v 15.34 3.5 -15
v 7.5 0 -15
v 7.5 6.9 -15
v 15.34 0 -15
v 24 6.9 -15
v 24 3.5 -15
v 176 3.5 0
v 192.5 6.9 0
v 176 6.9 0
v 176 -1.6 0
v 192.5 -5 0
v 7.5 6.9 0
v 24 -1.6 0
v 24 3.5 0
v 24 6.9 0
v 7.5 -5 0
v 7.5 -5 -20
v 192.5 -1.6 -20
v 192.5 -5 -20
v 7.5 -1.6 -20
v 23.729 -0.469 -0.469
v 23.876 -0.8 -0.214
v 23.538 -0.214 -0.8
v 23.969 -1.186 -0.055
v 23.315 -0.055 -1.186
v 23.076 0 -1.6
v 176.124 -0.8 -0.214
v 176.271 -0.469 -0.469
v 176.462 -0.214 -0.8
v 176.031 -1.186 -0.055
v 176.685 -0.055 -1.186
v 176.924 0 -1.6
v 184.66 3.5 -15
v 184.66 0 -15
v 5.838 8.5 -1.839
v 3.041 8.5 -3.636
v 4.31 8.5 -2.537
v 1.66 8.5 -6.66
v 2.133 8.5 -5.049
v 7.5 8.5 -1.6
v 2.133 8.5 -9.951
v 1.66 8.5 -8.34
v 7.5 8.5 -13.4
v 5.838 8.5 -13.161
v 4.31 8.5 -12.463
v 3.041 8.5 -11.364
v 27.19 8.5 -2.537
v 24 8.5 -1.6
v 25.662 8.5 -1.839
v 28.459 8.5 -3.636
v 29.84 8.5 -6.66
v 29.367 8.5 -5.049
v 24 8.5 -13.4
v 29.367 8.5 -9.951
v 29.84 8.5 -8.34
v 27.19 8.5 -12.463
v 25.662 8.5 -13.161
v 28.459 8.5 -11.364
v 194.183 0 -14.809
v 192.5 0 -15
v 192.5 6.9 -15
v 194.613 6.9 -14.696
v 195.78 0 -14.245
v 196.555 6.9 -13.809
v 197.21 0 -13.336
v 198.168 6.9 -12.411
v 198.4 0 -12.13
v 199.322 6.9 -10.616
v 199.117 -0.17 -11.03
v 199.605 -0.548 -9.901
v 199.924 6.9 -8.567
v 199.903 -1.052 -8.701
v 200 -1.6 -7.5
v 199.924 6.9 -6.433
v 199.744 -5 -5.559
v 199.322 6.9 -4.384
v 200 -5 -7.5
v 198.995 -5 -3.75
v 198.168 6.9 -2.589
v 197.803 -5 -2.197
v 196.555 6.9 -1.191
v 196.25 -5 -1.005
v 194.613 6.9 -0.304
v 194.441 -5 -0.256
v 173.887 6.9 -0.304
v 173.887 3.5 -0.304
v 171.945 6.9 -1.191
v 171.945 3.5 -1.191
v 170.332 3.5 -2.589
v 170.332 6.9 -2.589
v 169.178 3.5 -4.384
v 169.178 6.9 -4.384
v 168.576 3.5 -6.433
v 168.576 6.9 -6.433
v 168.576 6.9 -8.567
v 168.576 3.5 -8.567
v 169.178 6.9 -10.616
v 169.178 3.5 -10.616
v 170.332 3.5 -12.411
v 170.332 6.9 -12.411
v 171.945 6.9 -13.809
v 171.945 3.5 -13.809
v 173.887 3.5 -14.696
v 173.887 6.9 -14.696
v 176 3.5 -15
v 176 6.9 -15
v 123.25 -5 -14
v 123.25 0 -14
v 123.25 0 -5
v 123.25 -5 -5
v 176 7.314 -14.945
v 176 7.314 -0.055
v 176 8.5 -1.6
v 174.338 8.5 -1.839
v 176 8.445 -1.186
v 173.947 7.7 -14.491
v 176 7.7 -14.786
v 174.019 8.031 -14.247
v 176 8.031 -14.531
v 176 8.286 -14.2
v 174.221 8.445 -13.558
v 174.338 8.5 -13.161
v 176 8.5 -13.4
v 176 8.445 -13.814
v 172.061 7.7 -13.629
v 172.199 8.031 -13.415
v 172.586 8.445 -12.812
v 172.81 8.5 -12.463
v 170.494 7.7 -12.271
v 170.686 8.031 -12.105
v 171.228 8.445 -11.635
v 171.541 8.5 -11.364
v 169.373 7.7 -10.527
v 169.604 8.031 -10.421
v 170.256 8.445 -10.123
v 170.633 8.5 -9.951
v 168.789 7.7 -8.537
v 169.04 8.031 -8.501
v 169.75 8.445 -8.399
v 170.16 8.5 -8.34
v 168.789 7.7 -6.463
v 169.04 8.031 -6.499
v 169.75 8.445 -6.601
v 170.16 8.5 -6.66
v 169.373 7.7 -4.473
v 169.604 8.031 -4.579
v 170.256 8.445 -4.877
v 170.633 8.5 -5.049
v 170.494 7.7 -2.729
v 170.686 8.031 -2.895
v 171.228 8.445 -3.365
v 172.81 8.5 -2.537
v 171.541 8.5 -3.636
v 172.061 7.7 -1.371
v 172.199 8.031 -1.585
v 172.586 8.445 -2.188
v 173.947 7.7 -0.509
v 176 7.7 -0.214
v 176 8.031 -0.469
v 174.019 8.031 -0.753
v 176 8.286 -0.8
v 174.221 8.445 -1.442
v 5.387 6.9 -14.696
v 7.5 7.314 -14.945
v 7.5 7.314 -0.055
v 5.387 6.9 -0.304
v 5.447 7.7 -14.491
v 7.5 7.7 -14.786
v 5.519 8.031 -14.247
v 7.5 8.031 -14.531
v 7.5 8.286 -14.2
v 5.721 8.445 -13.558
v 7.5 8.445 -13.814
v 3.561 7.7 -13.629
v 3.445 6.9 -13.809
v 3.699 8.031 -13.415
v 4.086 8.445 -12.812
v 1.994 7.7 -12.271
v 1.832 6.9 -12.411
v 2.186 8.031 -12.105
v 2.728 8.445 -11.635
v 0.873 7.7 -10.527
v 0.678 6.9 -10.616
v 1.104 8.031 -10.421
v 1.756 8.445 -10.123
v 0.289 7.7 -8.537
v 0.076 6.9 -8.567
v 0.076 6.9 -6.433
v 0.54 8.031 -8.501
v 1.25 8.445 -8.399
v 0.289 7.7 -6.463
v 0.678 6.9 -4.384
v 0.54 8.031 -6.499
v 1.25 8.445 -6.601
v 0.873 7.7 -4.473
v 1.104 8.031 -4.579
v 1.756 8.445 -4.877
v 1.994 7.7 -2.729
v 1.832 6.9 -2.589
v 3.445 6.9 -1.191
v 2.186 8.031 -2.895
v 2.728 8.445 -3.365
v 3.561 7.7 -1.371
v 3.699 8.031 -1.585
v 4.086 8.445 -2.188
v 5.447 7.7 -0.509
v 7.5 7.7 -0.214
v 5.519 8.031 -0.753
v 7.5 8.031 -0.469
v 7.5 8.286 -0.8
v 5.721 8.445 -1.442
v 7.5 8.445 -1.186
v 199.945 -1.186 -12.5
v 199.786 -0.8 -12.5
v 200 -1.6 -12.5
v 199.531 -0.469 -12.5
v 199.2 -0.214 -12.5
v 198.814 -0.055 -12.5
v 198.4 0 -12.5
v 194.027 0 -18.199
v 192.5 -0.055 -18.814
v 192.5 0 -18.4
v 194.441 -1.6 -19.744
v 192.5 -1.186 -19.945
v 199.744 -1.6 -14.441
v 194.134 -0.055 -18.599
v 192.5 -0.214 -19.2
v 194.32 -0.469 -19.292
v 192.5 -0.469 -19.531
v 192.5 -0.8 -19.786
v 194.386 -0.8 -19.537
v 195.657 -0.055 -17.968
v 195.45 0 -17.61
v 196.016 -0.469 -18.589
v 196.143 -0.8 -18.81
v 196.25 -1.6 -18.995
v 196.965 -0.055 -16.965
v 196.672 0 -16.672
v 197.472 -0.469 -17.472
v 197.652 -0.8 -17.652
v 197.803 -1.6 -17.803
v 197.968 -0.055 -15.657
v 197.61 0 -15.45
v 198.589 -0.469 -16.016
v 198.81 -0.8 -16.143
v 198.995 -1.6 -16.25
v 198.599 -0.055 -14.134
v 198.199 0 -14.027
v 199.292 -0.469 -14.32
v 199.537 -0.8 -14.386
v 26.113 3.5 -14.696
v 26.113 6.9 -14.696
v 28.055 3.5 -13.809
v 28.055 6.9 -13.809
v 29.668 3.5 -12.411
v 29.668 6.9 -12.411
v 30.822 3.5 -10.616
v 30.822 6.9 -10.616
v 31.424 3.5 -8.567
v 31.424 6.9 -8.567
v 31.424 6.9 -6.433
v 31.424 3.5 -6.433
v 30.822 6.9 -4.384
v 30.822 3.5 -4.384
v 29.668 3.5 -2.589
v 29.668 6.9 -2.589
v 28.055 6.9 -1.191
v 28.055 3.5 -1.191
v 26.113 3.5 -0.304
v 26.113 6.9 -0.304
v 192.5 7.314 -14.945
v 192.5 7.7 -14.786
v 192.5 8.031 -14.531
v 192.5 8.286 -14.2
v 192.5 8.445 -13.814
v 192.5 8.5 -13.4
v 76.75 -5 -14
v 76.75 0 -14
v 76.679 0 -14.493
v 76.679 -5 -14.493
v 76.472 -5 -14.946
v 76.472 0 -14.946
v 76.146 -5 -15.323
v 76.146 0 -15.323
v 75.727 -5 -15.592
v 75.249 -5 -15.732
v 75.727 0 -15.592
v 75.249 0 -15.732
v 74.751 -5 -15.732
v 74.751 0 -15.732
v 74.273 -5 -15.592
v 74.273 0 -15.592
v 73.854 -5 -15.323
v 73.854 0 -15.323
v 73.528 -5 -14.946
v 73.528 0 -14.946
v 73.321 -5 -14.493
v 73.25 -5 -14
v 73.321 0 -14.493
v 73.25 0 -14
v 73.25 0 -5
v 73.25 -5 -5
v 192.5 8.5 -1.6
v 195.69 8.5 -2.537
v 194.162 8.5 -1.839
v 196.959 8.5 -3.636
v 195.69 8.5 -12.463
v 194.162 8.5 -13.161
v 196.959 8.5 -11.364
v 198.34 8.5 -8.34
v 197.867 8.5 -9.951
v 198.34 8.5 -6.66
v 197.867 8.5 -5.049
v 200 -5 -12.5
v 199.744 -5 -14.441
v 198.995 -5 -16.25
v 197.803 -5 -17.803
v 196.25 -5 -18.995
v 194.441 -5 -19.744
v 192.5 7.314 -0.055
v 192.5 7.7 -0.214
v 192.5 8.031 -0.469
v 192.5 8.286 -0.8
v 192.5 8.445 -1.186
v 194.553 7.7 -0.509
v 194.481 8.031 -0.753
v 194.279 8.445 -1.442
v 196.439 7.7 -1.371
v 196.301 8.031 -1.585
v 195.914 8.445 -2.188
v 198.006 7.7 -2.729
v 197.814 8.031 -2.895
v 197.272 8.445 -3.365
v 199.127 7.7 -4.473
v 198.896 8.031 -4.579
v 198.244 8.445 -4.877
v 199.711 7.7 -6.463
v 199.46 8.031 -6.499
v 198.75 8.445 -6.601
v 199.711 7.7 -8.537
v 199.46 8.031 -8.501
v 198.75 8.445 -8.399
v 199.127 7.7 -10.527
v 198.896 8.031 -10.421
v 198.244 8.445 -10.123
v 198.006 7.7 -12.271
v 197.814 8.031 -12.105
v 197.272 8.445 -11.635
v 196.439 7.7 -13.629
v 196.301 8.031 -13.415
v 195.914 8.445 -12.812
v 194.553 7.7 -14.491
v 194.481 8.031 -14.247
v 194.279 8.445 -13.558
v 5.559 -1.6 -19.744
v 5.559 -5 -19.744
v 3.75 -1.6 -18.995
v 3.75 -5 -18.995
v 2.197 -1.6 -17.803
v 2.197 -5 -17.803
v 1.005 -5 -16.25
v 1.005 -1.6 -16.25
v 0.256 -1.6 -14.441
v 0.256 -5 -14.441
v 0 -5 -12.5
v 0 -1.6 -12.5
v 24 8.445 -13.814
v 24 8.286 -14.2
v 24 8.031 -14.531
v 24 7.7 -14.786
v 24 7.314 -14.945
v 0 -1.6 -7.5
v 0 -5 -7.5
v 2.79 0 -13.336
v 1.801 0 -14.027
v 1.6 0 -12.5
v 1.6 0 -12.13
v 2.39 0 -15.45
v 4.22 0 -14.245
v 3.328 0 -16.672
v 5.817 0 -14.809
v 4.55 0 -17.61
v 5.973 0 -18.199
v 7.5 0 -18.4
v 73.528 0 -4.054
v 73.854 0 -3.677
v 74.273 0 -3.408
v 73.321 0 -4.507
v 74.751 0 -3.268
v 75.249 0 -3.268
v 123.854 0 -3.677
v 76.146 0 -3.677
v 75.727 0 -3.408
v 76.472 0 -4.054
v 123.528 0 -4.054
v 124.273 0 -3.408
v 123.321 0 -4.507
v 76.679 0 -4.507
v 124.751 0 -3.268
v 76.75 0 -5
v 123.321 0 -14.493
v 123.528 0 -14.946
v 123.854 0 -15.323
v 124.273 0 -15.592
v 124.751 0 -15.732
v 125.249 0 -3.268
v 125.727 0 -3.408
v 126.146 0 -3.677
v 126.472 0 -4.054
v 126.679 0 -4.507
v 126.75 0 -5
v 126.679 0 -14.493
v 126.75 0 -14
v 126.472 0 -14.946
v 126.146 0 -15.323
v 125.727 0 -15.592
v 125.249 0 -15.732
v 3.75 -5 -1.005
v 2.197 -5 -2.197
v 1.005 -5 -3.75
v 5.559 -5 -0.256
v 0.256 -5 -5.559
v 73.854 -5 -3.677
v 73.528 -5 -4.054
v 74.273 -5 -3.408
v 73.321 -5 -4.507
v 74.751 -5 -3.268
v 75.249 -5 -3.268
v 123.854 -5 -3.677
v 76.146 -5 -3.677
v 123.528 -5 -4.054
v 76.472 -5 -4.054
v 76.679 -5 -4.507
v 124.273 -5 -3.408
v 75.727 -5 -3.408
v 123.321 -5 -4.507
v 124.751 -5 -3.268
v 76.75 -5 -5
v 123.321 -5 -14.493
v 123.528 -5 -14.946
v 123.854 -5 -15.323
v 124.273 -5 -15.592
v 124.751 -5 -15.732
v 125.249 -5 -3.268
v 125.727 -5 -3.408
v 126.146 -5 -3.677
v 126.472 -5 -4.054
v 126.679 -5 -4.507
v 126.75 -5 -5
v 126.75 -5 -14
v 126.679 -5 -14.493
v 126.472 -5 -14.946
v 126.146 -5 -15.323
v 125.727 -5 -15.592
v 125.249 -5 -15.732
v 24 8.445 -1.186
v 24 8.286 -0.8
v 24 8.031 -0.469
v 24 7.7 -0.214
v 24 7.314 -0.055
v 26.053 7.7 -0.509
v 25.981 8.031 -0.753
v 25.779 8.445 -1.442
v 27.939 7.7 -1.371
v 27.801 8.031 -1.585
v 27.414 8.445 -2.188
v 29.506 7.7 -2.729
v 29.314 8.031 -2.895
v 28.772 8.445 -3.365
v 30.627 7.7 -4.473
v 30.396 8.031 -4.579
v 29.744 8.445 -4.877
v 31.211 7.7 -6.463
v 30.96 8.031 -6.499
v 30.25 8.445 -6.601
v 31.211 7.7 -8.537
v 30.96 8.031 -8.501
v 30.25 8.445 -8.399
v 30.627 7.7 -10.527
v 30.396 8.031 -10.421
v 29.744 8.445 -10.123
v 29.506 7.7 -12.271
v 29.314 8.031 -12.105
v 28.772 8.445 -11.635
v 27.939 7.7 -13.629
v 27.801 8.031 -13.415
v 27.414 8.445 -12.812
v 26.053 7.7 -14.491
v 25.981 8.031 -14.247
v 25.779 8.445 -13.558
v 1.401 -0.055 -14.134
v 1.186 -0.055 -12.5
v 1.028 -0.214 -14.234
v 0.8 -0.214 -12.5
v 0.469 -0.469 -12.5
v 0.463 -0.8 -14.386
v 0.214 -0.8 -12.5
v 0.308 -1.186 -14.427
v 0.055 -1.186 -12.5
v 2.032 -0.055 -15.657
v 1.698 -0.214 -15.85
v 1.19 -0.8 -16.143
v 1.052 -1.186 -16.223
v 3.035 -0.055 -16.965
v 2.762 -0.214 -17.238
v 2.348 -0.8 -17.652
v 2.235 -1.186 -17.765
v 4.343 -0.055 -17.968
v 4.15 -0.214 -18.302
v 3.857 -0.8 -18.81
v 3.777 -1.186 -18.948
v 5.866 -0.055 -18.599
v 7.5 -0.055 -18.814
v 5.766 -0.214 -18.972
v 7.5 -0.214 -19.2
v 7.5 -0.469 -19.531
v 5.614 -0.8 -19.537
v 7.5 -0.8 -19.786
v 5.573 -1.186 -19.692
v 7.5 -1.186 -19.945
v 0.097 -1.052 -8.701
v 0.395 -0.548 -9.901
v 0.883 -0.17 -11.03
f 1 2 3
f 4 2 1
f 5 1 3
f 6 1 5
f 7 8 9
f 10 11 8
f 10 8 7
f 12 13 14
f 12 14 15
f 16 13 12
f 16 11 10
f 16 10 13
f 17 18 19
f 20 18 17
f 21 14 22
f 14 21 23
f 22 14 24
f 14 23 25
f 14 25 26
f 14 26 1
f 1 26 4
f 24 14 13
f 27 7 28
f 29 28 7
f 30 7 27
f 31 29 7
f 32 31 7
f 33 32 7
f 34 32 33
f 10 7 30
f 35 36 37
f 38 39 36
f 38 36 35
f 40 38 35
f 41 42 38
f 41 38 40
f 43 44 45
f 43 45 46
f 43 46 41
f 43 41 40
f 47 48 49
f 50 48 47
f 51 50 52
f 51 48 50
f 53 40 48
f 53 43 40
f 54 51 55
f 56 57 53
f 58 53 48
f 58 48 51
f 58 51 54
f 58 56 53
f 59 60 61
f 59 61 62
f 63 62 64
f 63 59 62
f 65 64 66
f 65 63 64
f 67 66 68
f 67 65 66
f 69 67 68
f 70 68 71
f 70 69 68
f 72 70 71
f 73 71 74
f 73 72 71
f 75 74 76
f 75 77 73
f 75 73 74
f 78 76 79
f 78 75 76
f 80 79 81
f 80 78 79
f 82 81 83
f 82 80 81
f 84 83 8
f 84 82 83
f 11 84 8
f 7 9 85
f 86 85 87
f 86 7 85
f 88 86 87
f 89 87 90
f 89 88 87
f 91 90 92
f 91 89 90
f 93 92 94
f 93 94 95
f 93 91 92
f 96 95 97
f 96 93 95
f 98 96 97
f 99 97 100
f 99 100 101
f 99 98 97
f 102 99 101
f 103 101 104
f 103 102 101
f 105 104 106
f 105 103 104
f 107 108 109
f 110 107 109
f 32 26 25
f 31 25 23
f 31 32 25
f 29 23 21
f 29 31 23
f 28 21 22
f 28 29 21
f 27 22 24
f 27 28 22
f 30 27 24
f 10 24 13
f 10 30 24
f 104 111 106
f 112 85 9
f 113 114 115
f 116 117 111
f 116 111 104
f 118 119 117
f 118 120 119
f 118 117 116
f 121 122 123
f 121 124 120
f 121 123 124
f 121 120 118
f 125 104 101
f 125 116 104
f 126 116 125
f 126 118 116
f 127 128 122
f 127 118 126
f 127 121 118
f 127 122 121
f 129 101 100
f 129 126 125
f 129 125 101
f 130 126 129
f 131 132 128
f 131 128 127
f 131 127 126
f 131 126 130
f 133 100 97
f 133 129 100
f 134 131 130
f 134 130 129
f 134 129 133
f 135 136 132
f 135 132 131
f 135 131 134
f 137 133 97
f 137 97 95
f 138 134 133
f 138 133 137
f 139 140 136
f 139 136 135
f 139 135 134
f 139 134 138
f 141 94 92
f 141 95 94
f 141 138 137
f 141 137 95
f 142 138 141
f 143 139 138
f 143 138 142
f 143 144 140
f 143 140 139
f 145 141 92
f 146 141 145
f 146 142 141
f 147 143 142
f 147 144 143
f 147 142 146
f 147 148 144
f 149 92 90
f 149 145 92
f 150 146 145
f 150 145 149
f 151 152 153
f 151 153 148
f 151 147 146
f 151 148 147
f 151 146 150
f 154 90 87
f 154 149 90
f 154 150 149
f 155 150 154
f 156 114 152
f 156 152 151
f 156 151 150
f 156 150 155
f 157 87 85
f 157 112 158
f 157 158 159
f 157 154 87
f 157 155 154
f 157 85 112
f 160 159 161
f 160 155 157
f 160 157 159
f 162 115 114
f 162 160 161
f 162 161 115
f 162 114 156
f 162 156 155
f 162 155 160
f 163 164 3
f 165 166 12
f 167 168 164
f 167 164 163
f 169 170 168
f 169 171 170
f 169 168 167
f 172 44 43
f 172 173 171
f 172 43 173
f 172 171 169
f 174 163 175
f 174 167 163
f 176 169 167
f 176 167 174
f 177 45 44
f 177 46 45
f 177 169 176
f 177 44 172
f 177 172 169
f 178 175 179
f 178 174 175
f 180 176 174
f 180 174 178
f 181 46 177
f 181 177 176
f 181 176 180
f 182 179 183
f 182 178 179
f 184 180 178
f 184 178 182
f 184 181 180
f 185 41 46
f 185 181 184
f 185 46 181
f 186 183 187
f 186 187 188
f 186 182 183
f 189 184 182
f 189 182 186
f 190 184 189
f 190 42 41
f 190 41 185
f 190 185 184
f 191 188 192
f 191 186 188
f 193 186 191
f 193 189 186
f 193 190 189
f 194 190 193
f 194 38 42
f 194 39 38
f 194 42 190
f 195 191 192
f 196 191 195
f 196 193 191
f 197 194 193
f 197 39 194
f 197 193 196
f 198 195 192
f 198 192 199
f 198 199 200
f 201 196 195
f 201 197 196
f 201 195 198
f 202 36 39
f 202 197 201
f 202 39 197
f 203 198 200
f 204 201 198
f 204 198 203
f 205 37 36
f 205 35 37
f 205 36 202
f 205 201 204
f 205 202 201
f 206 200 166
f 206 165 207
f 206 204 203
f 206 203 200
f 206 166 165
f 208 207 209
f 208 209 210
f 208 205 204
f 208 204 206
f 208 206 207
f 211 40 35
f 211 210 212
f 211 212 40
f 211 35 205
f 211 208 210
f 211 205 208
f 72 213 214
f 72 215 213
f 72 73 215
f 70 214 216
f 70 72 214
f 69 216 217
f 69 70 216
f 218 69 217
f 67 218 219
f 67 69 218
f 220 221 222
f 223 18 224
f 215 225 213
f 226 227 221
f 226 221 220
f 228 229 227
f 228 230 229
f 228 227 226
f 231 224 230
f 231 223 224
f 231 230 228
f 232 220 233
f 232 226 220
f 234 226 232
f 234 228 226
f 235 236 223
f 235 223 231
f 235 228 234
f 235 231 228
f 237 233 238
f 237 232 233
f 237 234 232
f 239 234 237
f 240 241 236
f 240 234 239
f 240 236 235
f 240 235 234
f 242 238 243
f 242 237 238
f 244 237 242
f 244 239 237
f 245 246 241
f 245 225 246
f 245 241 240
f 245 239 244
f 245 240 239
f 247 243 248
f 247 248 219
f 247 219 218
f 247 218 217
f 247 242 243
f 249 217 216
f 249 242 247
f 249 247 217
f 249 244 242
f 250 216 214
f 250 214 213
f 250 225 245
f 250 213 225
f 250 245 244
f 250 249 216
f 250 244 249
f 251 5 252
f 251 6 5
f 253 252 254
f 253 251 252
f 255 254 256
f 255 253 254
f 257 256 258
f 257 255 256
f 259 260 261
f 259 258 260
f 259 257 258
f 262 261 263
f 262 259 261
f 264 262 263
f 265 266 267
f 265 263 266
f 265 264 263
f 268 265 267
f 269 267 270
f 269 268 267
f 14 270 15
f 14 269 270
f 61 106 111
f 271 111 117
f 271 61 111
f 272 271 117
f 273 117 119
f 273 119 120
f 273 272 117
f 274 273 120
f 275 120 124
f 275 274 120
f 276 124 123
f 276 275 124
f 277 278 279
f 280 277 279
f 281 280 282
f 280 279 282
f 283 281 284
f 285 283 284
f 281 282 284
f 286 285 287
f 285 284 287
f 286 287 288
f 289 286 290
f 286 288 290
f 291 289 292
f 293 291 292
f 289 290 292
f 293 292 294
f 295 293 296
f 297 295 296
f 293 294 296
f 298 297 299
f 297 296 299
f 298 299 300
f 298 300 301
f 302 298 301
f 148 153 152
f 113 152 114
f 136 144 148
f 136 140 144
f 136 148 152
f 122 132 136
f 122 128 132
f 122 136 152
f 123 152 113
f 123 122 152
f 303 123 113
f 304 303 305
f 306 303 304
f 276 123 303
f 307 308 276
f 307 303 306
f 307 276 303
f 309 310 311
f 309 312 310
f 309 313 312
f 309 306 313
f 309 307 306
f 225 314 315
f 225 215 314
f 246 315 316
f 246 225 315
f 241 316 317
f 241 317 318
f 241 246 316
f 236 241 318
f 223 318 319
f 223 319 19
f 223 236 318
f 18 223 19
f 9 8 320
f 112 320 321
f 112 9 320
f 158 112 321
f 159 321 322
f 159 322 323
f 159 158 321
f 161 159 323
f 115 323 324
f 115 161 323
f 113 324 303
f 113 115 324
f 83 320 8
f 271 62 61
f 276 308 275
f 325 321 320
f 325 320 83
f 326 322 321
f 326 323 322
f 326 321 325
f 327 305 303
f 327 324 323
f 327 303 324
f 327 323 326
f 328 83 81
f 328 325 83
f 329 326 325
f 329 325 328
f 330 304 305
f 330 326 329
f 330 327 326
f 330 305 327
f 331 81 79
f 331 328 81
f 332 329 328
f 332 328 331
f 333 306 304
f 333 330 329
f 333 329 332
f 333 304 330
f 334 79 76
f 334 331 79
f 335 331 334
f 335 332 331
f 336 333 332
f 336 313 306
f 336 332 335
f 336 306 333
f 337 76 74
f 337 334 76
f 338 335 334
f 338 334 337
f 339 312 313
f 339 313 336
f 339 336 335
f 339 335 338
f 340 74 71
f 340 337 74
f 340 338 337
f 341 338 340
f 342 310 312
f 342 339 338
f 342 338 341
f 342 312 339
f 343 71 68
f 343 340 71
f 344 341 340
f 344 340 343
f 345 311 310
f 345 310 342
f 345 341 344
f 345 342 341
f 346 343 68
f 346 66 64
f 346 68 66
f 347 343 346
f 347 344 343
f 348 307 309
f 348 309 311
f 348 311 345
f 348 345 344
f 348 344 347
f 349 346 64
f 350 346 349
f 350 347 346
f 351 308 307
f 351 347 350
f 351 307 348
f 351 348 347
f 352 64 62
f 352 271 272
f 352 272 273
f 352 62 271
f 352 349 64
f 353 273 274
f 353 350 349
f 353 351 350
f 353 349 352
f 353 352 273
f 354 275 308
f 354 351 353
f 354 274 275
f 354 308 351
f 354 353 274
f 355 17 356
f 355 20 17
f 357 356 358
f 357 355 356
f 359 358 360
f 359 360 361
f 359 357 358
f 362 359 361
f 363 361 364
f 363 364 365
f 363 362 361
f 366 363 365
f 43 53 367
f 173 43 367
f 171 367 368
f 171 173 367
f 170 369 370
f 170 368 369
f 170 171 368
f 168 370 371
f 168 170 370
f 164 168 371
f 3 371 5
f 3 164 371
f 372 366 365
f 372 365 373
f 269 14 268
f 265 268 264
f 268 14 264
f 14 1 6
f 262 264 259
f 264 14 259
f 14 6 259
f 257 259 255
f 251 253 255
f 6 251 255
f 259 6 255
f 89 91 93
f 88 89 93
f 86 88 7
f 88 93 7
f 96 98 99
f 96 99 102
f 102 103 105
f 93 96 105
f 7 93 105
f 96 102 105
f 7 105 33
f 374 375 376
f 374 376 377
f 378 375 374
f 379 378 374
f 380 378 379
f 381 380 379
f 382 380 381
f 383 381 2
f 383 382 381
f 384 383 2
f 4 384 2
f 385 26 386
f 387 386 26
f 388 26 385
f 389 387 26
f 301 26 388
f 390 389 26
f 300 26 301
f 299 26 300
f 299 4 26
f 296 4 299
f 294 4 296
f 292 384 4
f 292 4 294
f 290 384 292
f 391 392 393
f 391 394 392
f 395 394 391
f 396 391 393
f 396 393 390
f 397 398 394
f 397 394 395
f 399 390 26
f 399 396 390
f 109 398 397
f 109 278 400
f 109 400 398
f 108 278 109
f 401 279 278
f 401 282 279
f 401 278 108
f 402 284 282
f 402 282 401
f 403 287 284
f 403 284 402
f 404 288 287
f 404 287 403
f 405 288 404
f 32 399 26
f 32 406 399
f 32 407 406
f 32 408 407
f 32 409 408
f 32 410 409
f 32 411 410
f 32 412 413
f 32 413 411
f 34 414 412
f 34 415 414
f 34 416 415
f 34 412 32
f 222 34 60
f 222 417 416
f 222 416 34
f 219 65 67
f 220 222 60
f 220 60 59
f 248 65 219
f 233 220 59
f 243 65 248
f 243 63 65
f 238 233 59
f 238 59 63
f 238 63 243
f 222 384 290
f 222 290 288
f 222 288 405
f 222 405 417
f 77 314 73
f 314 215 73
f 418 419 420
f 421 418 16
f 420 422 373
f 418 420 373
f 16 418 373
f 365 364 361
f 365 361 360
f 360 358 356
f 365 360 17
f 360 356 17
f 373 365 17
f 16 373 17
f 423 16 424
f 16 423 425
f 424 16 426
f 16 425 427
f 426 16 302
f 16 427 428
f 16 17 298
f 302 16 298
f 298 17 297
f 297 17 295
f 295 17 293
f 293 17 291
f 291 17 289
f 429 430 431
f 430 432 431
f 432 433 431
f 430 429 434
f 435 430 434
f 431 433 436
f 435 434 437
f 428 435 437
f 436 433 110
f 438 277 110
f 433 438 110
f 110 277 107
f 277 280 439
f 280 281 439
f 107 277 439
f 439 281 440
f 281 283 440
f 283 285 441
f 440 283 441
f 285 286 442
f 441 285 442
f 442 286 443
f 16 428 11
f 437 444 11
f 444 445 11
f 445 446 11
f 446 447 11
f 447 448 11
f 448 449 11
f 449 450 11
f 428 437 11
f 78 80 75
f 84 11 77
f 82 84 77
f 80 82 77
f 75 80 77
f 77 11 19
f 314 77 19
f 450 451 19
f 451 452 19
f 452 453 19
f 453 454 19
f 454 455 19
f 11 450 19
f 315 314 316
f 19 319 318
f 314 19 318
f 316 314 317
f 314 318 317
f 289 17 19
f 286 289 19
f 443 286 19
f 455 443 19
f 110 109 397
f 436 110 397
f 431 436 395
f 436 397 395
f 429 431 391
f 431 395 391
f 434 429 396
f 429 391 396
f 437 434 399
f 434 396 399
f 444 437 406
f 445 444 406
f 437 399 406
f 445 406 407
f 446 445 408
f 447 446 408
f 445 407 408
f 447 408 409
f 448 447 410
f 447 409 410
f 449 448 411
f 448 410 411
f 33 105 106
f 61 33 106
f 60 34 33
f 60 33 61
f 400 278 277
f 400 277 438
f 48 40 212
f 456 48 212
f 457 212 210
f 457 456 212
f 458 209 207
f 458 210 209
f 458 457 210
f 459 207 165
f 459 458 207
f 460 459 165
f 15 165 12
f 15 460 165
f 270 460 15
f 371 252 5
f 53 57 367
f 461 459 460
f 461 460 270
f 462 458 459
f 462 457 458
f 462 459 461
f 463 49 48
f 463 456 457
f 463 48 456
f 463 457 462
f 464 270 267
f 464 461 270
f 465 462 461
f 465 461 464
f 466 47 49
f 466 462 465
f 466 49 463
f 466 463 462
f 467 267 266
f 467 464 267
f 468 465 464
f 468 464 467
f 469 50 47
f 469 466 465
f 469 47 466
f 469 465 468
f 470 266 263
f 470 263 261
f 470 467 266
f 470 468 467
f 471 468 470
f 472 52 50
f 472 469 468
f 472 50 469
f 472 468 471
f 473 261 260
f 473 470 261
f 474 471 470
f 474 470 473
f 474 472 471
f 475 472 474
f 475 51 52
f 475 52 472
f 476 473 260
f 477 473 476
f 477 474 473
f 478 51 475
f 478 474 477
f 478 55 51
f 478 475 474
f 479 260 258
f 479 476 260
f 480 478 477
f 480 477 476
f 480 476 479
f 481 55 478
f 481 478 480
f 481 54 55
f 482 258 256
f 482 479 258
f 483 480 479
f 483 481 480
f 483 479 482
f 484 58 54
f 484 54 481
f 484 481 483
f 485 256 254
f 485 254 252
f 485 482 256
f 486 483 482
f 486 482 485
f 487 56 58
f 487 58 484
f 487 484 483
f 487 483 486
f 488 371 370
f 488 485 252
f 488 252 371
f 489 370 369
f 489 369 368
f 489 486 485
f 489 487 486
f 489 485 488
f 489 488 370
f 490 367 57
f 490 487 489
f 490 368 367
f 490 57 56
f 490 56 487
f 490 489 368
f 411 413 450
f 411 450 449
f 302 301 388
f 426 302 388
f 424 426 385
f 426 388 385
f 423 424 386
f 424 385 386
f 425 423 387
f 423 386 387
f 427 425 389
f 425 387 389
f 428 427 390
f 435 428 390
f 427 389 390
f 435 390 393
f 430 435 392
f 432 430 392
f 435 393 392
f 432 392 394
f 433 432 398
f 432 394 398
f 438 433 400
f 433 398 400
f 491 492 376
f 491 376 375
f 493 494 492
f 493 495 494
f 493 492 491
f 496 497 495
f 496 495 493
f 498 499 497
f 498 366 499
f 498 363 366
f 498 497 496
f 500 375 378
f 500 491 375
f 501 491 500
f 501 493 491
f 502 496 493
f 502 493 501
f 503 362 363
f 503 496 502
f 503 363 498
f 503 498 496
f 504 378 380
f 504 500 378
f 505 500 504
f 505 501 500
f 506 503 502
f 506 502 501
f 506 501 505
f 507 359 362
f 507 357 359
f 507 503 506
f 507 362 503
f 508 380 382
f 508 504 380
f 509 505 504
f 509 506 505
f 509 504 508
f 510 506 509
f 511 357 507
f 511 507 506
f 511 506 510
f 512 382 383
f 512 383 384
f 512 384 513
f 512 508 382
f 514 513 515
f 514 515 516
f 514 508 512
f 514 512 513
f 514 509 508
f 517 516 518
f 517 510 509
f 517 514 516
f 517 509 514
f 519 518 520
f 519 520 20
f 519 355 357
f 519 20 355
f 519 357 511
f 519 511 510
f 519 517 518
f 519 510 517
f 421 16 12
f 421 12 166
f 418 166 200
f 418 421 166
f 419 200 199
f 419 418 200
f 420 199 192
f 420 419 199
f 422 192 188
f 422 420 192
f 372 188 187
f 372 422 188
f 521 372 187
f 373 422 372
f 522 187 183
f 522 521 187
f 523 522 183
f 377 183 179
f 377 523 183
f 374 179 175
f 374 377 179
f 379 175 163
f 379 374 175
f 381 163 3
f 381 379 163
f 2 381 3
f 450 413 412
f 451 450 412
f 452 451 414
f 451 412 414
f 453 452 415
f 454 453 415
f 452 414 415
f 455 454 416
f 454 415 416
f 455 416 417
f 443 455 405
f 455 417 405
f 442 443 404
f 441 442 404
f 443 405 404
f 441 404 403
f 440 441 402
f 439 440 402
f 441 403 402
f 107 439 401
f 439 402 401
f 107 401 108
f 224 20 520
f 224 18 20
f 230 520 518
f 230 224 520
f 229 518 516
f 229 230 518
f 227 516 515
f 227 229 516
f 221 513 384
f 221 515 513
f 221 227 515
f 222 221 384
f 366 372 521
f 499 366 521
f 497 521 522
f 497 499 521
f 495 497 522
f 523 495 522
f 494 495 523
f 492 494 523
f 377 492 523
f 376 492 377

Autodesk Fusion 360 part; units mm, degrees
sketch "Sketch1" plane through (0, 0, 0) normal (0, 1, 0) x (1, 0, 0)
  line L0 (100, 0) -> (24, 0)
  line L1 (100, 0) -> (176, 0)
  line L2 (176, 0) -> (224, 0) construction
  arc A0 (24, 0) -> (24, 15) centre (24, 7.5) ccw
  arc A1 (176, 15) -> (176, 0) centre (176, 7.5) ccw
  arc A2 (7.5, 15) -> (7.5, 0) centre (7.5, 7.5) ccw
  arc A3 (192.5, 0) -> (192.5, 15) centre (192.5, 7.5) ccw
  arc A4 (7.5, 25) -> (0, 17.5) centre (7.5, 17.5) ccw
  arc A5 (200, 17.5) -> (192.5, 25) centre (192.5, 17.5) ccw
  line L3 (9.5662, 25) -> (12.453, 20)
  line L4 (192.5, 25) -> (190.4338, 25)
  line L5 (190.4338, 25) -> (187.547, 20)
  line L6 (187.547, 20) -> (12.453, 20)
  line L7 (7.5, 25) -> (9.5662, 25)
  line L8 (192.5, 0) -> (7.5, 0)
  line L9 (0, 17.5) -> (0, 7.5)
  line L10 (200, 17.5) -> (200, 7.5)
  line L11 (100, 20) -> (100, 0)
  line L12 (123.25, 15.0004) -> (123.25, 4)
  line L13 (126.75, 15.0004) -> (126.75, 4)
  arc A6 (126.75, 15.0004) -> (123.25, 15.0004) centre (125, 15) ccw
  arc A7 (123.25, 4) -> (126.75, 4) centre (125, 4) ccw
  line L14 (73.25, 15.0004) -> (73.25, 4)
  arc A8 (76.75, 15.0004) -> (73.25, 15.0004) centre (75, 15) ccw
  line L15 (76.75, 15.0004) -> (76.75, 4)
  arc A9 (73.25, 4) -> (76.75, 4) centre (75, 4) ccw
  line L16 (24, 0) -> (12.453, 20)
  line L17 (176, 0) -> (187.547, 20)
  line L18 (176, 15) -> (192.5, 15)
  line L19 (7.5, 15) -> (24, 15)
  point P0 (7.5, 17.5)
  point P1 (192.5, 17.5)
extrude "Extrude1" add sketch "Sketch1" against normal blind 5 makes body 1
extrude "Extrude2" add sketch "Sketch1" along normal blind 5 contours A0 L16 L19 | A2 L8 L16 L19 | A3 L8 L17 L18 | A1 L17 L18 | A2 A4 L3 L7 L9 L16 L19 | A3 A5 L4 L5 L10 L17 L18 bodies 1
extrude "Extrude3" add sketch "Sketch1" along normal blind 10 separate body contours A0 L16 L19 | A2 L8 L16 L19 | A3 L8 L17 L18 | A1 L17 L18 makes body 2 at (18.5, 0, -5) makes body 3 at (187, 0, -5)
extrude "Extrude4" cut sketch "Sketch1" along normal blind 3.5 contours A0 L16 L19 | A1 L17 L18 bodies 2 3
extrude "Extrude5" cut 2 faces at (187, 10, -5) (18.5, 10, -5) along direction (0, -1, 0) blind 1.5 on bodies 2 3 bodies 2 3
extrude "Extrude6" cut 2 faces at (184.3868, 5, -5) (15.6132, 5, -5) along direction (0, -1, 0) blind 5 on bodies 1 bodies 1
combine "Combine1" operation add target body 3 tool bodies 2 1
sketch "Sketch2" plane through (0, 0, 0) normal (0, 1, 0) x (-1, 0, 0)
  arc A0 (-76.75, -15.0004) -> (-73.25, -15.0004) centre (-75, -15) ccw
  line L0 (-76.75, -15.0004) -> (-76.75, -4)
  arc A1 (-73.25, -4) -> (-76.75, -4) centre (-75, -4) ccw
  line L1 (-73.25, -4) -> (-73.25, -15.0004)
  arc A2 (-126.75, -15.0004) -> (-123.25, -15.0004) centre (-125, -15) ccw
  line L2 (-126.75, -15.0004) -> (-126.75, -4)
  arc A3 (-123.25, -4) -> (-126.75, -4) centre (-125, -4) ccw
  line L3 (-123.25, -4) -> (-123.25, -15.0004)
  line L4 (-176, 0) -> (-184.6603, -15)
  line L5 (-184.6603, -15) -> (-192.5, -15)
  arc A4 (-200, -7.5) -> (-192.5, -15) centre (-192.5, -7.5) ccw
  line L6 (-200, -7.5) -> (-200, -17.5)
  arc A5 (-200, -17.5) -> (-192.5, -25) centre (-192.5, -17.5) ccw
  line L7 (-192.5, -25) -> (-190.4338, -25)
  line L8 (-190.4338, -25) -> (-187.547, -20)
  line L9 (-187.547, -20) -> (-12.453, -20)
  line L10 (-12.453, -20) -> (-9.5662, -25)
  line L11 (-9.5662, -25) -> (-7.5, -25)
  arc A6 (-7.5, -25) -> (0, -17.5) centre (-7.5, -17.5) ccw
  line L12 (0, -17.5) -> (0, -7.5)
  arc A7 (-7.5, -15) -> (0, -7.5) centre (-7.5, -7.5) ccw
  line L13 (-7.5, -15) -> (-15.3397, -15)
  line L14 (-15.3397, -15) -> (-24, 0)
  line L15 (-24, 0) -> (-176, 0)
  arc A8 (-76.75, -14.0004) -> (-73.25, -14.0004) centre (-75, -14) ccw
  arc A9 (-73.25, -5) -> (-76.75, -5) centre (-75, -5) ccw
  line L16 (-73.25, -14.0004) -> (-73.25, -5)
  line L17 (-76.75, -5) -> (-76.75, -14.0004)
  line L18 (-100, -20) -> (-100, 0)
  line L19 (-126.75, -4) -> (-126.75, -15.0004)
  line L20 (-123.25, -15.0004) -> (-123.25, -4)
  arc A10 (-126.75, -14.0004) -> (-123.25, -14.0004) centre (-125, -14) ccw
  arc A11 (-123.25, -5) -> (-126.75, -5) centre (-125, -5) ccw
  line L21 (-123.25, -5) -> (-123.25, -14.0004)
  line L22 (-126.75, -14.0004) -> (-126.75, -5)
  point P0 (-125, -4)
  point P1 (-125, -15)
extrude "Extrude7" add sketch "Sketch2" against normal blind 5 contours A0 L0 L1 A8 | L0 A1 L1 A9 | A2 L2 L3 L19 L20 A10 | L2 A3 L3 L19 L20 A11 bodies 3
sketch "Sketch3" plane through (0, 0, 0) normal (0, 1, 0) x (-1, 0, 0)
  arc A0 (-76.75, -14.0004) -> (-73.25, -14.0004) centre (-75, -14) ccw
  line L0 (-76.75, -14.0004) -> (-76.75, -5)
  arc A1 (-73.25, -5) -> (-76.75, -5) centre (-75, -5) ccw
  line L1 (-73.25, -5) -> (-73.25, -14.0004)
  arc A2 (-126.75, -14.0004) -> (-123.25, -14.0004) centre (-125, -14) ccw
  line L2 (-126.75, -14.0004) -> (-126.75, -5)
  arc A3 (-123.25, -5) -> (-126.75, -5) centre (-125, -5) ccw
  line L3 (-123.25, -5) -> (-123.25, -14.0004)
  line L4 (-176, 0) -> (-184.6603, -15)
  line L5 (-184.6603, -15) -> (-192.5, -15)
  arc A4 (-200, -7.5) -> (-192.5, -15) centre (-192.5, -7.5) ccw
  line L6 (-200, -7.5) -> (-200, -17.5)
  arc A5 (-200, -17.5) -> (-192.5, -25) centre (-192.5, -17.5) ccw
  line L7 (-192.5, -25) -> (-190.4338, -25)
  line L8 (-190.4338, -25) -> (-187.547, -20)
  line L9 (-187.547, -20) -> (-12.453, -20)
  line L10 (-12.453, -20) -> (-9.5662, -25)
  line L11 (-9.5662, -25) -> (-7.5, -25)
  arc A6 (-7.5, -25) -> (0, -17.5) centre (-7.5, -17.5) ccw
  line L12 (0, -17.5) -> (0, -7.5)
  arc A7 (-7.5, -15) -> (0, -7.5) centre (-7.5, -7.5) ccw
  line L13 (-7.5, -15) -> (-15.3397, -15)
  line L14 (-15.3397, -15) -> (-24, 0)
  line L15 (-24, 0) -> (-176, 0)
  arc A8 (-7.5, -20) -> (0, -12.5) centre (-7.5, -12.5) ccw
  arc A9 (-200, -12.5) -> (-192.5, -20) centre (-192.5, -12.5) ccw
  line L16 (-192.5, -20) -> (-187.547, -20)
  line L17 (-7.5, -20) -> (-12.453, -20)
extrude "Extrude8" cut sketch "Sketch3" against normal blind 5 contours L6 A5 L7 L8 A9 L16 | L10 L11 A6 L12 A8 L17 bodies 3
fillet "Fillet1" radius 1.6 14 edges at (100, 0, 0) (200, 0, -10) (197.8033, 0, -17.8033) (100, 0, -20) (2.1967, 0, -17.8033) (0, 0, -10) (0, 8.5, -7.5) (15.75, 8.5, -15) (31.5, 8.5, -7.5) (15.75, 8.5, 0) (184.25, 8.5, -15) (200, 8.5, -7.5) (184.25, 8.5, 0) (168.5, 8.5, -7.5) on bodies 3
